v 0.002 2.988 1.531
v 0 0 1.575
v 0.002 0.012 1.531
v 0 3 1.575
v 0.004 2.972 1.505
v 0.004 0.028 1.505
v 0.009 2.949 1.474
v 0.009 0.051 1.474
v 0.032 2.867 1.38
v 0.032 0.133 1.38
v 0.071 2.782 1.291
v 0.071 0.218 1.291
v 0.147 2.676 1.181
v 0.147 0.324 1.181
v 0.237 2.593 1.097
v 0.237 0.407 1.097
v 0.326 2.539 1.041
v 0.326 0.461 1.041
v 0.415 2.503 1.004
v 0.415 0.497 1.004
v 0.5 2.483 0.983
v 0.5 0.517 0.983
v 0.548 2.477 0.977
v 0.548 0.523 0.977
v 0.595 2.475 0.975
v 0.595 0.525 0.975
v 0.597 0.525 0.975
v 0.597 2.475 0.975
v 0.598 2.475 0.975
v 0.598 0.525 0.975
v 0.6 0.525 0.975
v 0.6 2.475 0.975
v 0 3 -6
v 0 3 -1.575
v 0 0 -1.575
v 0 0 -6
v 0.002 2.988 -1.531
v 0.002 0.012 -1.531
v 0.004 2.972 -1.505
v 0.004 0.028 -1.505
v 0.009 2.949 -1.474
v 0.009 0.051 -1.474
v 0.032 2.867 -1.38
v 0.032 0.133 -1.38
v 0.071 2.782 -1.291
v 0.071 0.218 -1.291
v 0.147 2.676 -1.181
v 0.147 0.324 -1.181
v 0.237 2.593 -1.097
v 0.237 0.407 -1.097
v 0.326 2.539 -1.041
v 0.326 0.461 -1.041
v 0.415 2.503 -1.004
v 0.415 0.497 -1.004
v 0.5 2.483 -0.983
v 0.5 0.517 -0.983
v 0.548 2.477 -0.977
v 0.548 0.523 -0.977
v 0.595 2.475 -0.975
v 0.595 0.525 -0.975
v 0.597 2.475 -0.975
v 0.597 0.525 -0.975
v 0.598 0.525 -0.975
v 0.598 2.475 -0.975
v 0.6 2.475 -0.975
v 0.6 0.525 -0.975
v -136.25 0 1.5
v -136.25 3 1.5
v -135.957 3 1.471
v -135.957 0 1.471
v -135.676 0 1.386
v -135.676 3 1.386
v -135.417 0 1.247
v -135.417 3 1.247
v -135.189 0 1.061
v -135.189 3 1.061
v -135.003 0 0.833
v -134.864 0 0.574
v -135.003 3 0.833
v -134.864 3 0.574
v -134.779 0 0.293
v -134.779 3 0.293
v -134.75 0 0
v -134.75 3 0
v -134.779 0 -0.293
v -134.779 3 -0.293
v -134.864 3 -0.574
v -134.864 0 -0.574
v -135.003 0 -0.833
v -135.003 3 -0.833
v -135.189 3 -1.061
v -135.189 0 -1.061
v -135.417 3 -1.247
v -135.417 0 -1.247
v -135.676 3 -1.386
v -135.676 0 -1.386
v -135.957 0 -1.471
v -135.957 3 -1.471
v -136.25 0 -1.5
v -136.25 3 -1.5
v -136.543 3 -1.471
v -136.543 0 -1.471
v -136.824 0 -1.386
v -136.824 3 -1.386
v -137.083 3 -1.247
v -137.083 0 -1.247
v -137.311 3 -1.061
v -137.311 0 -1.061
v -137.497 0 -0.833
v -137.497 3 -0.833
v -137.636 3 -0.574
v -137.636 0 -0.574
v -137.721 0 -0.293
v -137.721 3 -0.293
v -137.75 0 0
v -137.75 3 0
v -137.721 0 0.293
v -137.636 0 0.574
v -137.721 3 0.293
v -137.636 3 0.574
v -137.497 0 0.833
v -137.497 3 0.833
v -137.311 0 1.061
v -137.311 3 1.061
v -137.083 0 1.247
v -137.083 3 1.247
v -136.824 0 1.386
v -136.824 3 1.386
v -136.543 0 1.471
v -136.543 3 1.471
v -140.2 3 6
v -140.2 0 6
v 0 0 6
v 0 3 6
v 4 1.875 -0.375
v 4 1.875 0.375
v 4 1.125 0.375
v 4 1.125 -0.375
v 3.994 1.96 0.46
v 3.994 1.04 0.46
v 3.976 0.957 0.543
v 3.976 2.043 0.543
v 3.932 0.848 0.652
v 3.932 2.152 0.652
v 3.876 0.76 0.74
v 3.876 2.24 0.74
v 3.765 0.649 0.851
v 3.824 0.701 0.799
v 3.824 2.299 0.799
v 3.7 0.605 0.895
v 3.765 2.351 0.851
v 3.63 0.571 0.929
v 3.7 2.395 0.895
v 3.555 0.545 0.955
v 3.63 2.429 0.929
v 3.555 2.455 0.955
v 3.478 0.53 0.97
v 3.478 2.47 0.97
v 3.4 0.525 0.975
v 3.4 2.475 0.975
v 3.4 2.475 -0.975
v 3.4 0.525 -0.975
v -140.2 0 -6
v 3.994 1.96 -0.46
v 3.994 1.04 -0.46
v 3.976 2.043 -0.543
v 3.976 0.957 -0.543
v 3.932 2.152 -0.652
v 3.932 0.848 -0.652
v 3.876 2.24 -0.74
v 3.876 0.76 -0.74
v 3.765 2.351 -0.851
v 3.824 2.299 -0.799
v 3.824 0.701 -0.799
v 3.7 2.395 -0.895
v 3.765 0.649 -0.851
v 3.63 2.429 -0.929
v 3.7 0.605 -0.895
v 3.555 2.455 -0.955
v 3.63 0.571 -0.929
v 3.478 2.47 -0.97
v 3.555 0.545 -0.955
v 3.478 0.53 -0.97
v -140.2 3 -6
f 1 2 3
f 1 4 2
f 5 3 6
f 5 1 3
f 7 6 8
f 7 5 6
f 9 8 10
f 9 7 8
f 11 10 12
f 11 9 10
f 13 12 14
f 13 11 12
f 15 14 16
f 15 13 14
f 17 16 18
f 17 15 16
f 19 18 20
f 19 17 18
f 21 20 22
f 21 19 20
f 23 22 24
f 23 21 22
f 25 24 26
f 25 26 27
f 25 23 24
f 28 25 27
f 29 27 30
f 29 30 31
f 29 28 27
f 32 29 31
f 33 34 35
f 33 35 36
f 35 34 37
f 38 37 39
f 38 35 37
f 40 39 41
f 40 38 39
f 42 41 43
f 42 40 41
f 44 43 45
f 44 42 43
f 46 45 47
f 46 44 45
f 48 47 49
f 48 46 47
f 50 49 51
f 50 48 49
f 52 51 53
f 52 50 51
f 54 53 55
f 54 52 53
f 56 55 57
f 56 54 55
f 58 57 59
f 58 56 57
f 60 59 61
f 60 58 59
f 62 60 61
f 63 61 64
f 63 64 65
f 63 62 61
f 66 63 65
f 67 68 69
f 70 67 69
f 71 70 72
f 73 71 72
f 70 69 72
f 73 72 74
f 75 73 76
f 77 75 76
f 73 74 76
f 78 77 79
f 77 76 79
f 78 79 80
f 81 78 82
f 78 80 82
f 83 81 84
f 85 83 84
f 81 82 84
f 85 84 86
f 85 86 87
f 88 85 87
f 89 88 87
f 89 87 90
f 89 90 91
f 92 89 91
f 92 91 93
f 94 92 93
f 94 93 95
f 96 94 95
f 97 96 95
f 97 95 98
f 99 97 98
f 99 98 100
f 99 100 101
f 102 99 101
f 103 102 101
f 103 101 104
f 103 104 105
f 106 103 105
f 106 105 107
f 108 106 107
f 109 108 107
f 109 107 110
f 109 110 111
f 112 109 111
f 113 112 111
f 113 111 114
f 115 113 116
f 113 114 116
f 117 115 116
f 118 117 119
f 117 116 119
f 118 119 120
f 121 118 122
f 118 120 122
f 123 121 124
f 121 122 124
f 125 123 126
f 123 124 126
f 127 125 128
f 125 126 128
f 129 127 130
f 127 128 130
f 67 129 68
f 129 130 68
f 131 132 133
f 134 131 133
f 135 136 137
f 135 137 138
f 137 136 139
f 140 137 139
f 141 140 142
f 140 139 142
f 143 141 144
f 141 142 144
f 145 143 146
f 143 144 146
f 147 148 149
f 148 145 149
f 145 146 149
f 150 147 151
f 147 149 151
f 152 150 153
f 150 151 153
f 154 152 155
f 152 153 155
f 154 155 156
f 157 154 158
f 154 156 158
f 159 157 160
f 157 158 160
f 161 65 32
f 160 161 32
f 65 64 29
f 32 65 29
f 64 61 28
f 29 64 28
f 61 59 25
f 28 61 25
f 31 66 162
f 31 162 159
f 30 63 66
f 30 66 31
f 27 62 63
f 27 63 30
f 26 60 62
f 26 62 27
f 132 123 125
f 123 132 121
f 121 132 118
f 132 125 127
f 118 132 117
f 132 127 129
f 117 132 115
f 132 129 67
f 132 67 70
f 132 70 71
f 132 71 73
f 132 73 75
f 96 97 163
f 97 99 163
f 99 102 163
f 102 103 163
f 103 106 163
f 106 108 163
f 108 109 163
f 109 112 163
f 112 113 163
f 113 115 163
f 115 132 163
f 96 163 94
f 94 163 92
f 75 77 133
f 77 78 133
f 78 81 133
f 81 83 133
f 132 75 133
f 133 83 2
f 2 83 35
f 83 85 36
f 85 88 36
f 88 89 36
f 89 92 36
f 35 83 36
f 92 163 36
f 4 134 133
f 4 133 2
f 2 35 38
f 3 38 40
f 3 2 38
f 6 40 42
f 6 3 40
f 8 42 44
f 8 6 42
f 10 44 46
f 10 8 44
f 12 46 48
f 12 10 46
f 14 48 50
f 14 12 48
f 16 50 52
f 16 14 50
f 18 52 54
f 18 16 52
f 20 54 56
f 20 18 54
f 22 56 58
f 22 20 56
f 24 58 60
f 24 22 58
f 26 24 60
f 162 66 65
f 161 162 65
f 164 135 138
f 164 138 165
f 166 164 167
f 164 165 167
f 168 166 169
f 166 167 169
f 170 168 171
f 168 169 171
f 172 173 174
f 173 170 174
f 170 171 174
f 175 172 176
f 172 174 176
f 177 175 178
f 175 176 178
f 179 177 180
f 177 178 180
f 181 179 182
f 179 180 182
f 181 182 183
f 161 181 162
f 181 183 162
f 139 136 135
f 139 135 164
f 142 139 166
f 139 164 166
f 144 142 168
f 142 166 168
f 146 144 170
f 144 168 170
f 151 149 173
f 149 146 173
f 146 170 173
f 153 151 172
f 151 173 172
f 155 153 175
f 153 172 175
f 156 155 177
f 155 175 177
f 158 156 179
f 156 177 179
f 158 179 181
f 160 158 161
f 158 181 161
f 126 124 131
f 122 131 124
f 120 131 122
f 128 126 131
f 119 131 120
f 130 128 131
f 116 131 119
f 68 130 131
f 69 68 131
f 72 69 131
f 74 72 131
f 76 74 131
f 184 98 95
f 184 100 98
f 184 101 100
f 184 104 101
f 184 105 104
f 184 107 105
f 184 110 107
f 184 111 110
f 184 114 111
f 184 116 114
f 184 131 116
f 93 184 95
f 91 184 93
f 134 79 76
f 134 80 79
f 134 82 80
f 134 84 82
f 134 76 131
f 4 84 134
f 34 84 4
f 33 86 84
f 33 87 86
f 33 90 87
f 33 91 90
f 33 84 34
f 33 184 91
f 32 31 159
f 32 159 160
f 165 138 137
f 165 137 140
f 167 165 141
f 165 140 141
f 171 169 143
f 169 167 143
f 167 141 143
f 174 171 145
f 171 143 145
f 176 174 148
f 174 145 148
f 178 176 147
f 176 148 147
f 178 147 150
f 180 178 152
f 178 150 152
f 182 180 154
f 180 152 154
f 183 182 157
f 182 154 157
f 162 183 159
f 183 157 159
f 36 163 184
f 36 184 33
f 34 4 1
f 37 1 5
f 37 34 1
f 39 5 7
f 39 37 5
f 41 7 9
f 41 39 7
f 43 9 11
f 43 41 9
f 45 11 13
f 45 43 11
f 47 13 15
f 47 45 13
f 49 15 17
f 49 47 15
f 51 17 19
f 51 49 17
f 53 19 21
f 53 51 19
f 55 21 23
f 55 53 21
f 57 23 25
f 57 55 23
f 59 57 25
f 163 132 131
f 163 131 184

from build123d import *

# Parameters (mm, degrees)
SKETCH1_W           = 280.4
SKETCH1_H           = 12
BOSS_EXTRUDE1_DEPTH = 3
SKETCH3_R           = 1.5
CUT_EXTRUDE1_DEPTH  = 141.360393274
SKETCH6_W           = 140.2
SKETCH6_H           = 12
CUT_EXTRUDE2_DEPTH  = 141.360393274
SKETCH7_W           = 1.95
SKETCH7_H           = 1.95
BOSS_EXTRUDE2_DEPTH = 4
FILLET1_R           = 0.6


with BuildPart() as part:
    # Sketch1 → Boss-Extrude1 (new body)
    with BuildSketch(Plane(origin=(0, 0, 0), x_dir=(1, 0, 0), z_dir=(0, 1, 0))):
        Rectangle(SKETCH1_W, SKETCH1_H)
    extrude(amount=BOSS_EXTRUDE1_DEPTH)

    # Sketch3 → Cut-Extrude1 (cut, through all)
    with BuildSketch(Plane(origin=(0, 3, 0), x_dir=(1, 0, 0), z_dir=(0, 1, 0))):
        with Locations(Location((-136.25, 0, 0), (0, 0, 270))):
            Circle(SKETCH3_R)
        with Locations(Location((136.25, 0, 0), (0, 0, 270))):
            Circle(SKETCH3_R)
    extrude(amount=-CUT_EXTRUDE1_DEPTH, mode=Mode.SUBTRACT)

    # Sketch6 → Cut-Extrude2 (cut, through all)
    with BuildSketch(Plane(origin=(0, 3, 0), x_dir=(1, 0, 0), z_dir=(0, 1, 0))):
        with Locations((70.1, 0)):
            Rectangle(SKETCH6_W, SKETCH6_H)
    extrude(amount=-CUT_EXTRUDE2_DEPTH, mode=Mode.SUBTRACT)

    # Sketch7 → Boss-Extrude2 (add)
    with BuildSketch(Plane(origin=(0, 0, 0), x_dir=(0, 0, -1), z_dir=(1, 0, 0))):
        with Locations((0, 1.5)):
            Rectangle(SKETCH7_W, SKETCH7_H)
    extrude(amount=BOSS_EXTRUDE2_DEPTH)

    # Fillet1
    # the kernel refuses this fillet: 0.6 mm, written as the material it adds along each edge
    with BuildSketch(Plane(origin=(0, 0.525, -0.975), x_dir=(0, 0, -1), z_dir=(0, 1, 0)), Plane(origin=(0, 2.475, 0.975), x_dir=(0, 0, 1), z_dir=(0, -1, 0))) as fillet1_piece_1:
        with BuildLine():
            CenterArc((FILLET1_R, -FILLET1_R), FILLET1_R, 90, 90)
            Line((0, -FILLET1_R), (0, 0))
            Line((0, 0), (FILLET1_R, 0))
        make_face()
    fillet1_piece_1_solid = extrude(amount=1.95, mode=Mode.PRIVATE)
    with BuildSketch(Plane(origin=(0, 2.475, -0.975), x_dir=(0, 1, 0), z_dir=(0, 0, 1)), Plane(origin=(0, 0.525, 0.975), x_dir=(0, -1, 0), z_dir=(0, 0, -1))) as fillet1_piece_2:
        with BuildLine():
            CenterArc((0.6, -0.595294045), FILLET1_R, 97.180755781, 82.819244219)
            Line((0, -0.595294045), (0, 0))
            Line((0, 0), (0.525, 0))
        make_face()
    fillet1_piece_2_solid = extrude(amount=1.95, mode=Mode.PRIVATE)
    with BuildSketch(Plane(origin=(0, -0.975, -0.975), x_dir=(0, 0, -1), z_dir=(0, 1, 0))) as fillet1_piece_3a_section:
        with BuildLine():
            CenterArc((FILLET1_R, -FILLET1_R), FILLET1_R, 90, 90)
            Line((0, -FILLET1_R), (0, 0))
            Line((0, 0), (FILLET1_R, 0))
        make_face()
    fillet1_piece_3a = extrude(amount=3.45, mode=Mode.PRIVATE)
    fillet1_piece_3a = split(fillet1_piece_3a, bisect_by=Plane(origin=(0, 0, -0.975), z_dir=(0, 1, 0)), keep=Keep.TOP, mode=Mode.PRIVATE)
    fillet1_piece_3a = split(fillet1_piece_3a, bisect_by=Plane(origin=(0, 0.525, -0.975), z_dir=(0, -1, 0)), keep=Keep.TOP, mode=Mode.PRIVATE)
    with BuildSketch(Plane(origin=(0, 0.525, 0.975), x_dir=(0, -1, 0), z_dir=(0, 0, -1))) as fillet1_piece_3b_section:
        with BuildLine():
            CenterArc((0.6, -0.595294045), FILLET1_R, 97.180755781, 82.819244219)
            Line((0, -0.595294045), (0, 0))
            Line((0, 0), (0.525, 0))
        make_face()
    fillet1_piece_3b = extrude(amount=3.438235112, mode=Mode.PRIVATE)
    fillet1_piece_3b = split(fillet1_piece_3b, bisect_by=Plane(origin=(0, 0.525, -0.975), z_dir=(0, 0, -1)), keep=Keep.TOP, mode=Mode.PRIVATE)
    fillet1_piece_3 = fillet1_piece_3a & fillet1_piece_3b
    with BuildSketch(Plane(origin=(0, 2.475, -2.463235112), x_dir=(0, 1, 0), z_dir=(0, 0, 1))) as fillet1_piece_4a_section:
        with BuildLine():
            CenterArc((0.6, -0.595294045), FILLET1_R, 97.180755781, 82.819244219)
            Line((0, -0.595294045), (0, 0))
            Line((0, 0), (0.525, 0))
        make_face()
    fillet1_piece_4a = extrude(amount=3.438235112, mode=Mode.PRIVATE)
    fillet1_piece_4a = split(fillet1_piece_4a, bisect_by=Plane(origin=(0, 2.475, -0.975), z_dir=(0, 0, -1)), keep=Keep.TOP, mode=Mode.PRIVATE)
    with BuildSketch(Plane(origin=(0, 0.525, -0.975), x_dir=(0, 0, -1), z_dir=(0, 1, 0))) as fillet1_piece_4b_section:
        with BuildLine():
            CenterArc((FILLET1_R, -FILLET1_R), FILLET1_R, 90, 90)
            Line((0, -FILLET1_R), (0, 0))
            Line((0, 0), (FILLET1_R, 0))
        make_face()
    fillet1_piece_4b = extrude(amount=3.45, mode=Mode.PRIVATE)
    fillet1_piece_4b = split(fillet1_piece_4b, bisect_by=Plane(origin=(0, 3, -0.975), z_dir=(0, -1, 0)), keep=Keep.TOP, mode=Mode.PRIVATE)
    fillet1_piece_4b = split(fillet1_piece_4b, bisect_by=Plane(origin=(0, 2.475, -0.975), z_dir=(0, 1, 0)), keep=Keep.TOP, mode=Mode.PRIVATE)
    fillet1_piece_4 = fillet1_piece_4a & fillet1_piece_4b
    with BuildSketch(Plane(origin=(0, 3.975, 0.975), x_dir=(0, 0, 1), z_dir=(0, -1, 0))) as fillet1_piece_5a_section:
        with BuildLine():
            CenterArc((FILLET1_R, -FILLET1_R), FILLET1_R, 90, 90)
            Line((0, -FILLET1_R), (0, 0))
            Line((0, 0), (FILLET1_R, 0))
        make_face()
    fillet1_piece_5a = extrude(amount=3.45, mode=Mode.PRIVATE)
    fillet1_piece_5a = split(fillet1_piece_5a, bisect_by=Plane(origin=(0, 3, 0.975), z_dir=(0, -1, 0)), keep=Keep.TOP, mode=Mode.PRIVATE)
    fillet1_piece_5a = split(fillet1_piece_5a, bisect_by=Plane(origin=(0, 2.475, 0.975), z_dir=(0, 1, 0)), keep=Keep.TOP, mode=Mode.PRIVATE)
    with BuildSketch(Plane(origin=(0, 2.475, -0.975), x_dir=(0, 1, 0), z_dir=(0, 0, 1))) as fillet1_piece_5b_section:
        with BuildLine():
            CenterArc((0.6, -0.595294045), FILLET1_R, 97.180755781, 82.819244219)
            Line((0, -0.595294045), (0, 0))
            Line((0, 0), (0.525, 0))
        make_face()
    fillet1_piece_5b = extrude(amount=3.438235112, mode=Mode.PRIVATE)
    fillet1_piece_5b = split(fillet1_piece_5b, bisect_by=Plane(origin=(0, 2.475, 0.975), z_dir=(0, 0, 1)), keep=Keep.TOP, mode=Mode.PRIVATE)
    fillet1_piece_5 = fillet1_piece_5a & fillet1_piece_5b
    with BuildSketch(Plane(origin=(0, 2.475, 0.975), x_dir=(0, 0, 1), z_dir=(0, -1, 0))) as fillet1_piece_6a_section:
        with BuildLine():
            CenterArc((FILLET1_R, -FILLET1_R), FILLET1_R, 90, 90)
            Line((0, -FILLET1_R), (0, 0))
            Line((0, 0), (FILLET1_R, 0))
        make_face()
    fillet1_piece_6a = extrude(amount=3.45, mode=Mode.PRIVATE)
    fillet1_piece_6a = split(fillet1_piece_6a, bisect_by=Plane(origin=(0, 0, 0.975), z_dir=(0, 1, 0)), keep=Keep.TOP, mode=Mode.PRIVATE)
    fillet1_piece_6a = split(fillet1_piece_6a, bisect_by=Plane(origin=(0, 0.525, 0.975), z_dir=(0, -1, 0)), keep=Keep.TOP, mode=Mode.PRIVATE)
    with BuildSketch(Plane(origin=(0, 0.525, 2.463235112), x_dir=(0, -1, 0), z_dir=(0, 0, -1))) as fillet1_piece_6b_section:
        with BuildLine():
            CenterArc((0.6, -0.595294045), FILLET1_R, 97.180755781, 82.819244219)
            Line((0, -0.595294045), (0, 0))
            Line((0, 0), (0.525, 0))
        make_face()
    fillet1_piece_6b = extrude(amount=3.438235112, mode=Mode.PRIVATE)
    fillet1_piece_6b = split(fillet1_piece_6b, bisect_by=Plane(origin=(0, 0.525, 0.975), z_dir=(0, 0, 1)), keep=Keep.TOP, mode=Mode.PRIVATE)
    fillet1_piece_6 = fillet1_piece_6a & fillet1_piece_6b
    add([fillet1_piece_1_solid, fillet1_piece_2_solid, fillet1_piece_3, fillet1_piece_4, fillet1_piece_5, fillet1_piece_6])
    # the kernel refuses this fillet: 0.6 mm, written as the material it takes off along each edge
    with BuildSketch(Plane(origin=(4, -0.975, -0.975), x_dir=(0, 0, 1), z_dir=(0, 1, 0)), Plane(origin=(4, 2.475, -2.475), x_dir=(0, -1, 0), z_dir=(0, 0, 1)), Plane(origin=(4, 0.525, 2.475), x_dir=(0, 1, 0), z_dir=(0, 0, -1))) as fillet1_2_piece_1:
        with BuildLine():
            CenterArc((FILLET1_R, -FILLET1_R), FILLET1_R, 90, 90)
            Line((0, -FILLET1_R), (0, 0))
            Line((0, 0), (FILLET1_R, 0))
        make_face()
    fillet1_2_piece_1_solid = extrude(amount=4.95, mode=Mode.PRIVATE)
    with BuildSketch(Plane(origin=(4, 3.975, 0.975), x_dir=(-1, 0, 0), z_dir=(0, -1, 0))) as fillet1_2_piece_2:
        with BuildLine():
            CenterArc((FILLET1_R, FILLET1_R), FILLET1_R, 180, 90)
            Line((0, FILLET1_R), (0, 0))
            Line((0, 0), (FILLET1_R, 0))
        make_face()
    fillet1_2_piece_2_solid = extrude(amount=4.95, mode=Mode.PRIVATE)
    add([fillet1_2_piece_1_solid, fillet1_2_piece_2_solid], mode=Mode.SUBTRACT)


solid = part.part
